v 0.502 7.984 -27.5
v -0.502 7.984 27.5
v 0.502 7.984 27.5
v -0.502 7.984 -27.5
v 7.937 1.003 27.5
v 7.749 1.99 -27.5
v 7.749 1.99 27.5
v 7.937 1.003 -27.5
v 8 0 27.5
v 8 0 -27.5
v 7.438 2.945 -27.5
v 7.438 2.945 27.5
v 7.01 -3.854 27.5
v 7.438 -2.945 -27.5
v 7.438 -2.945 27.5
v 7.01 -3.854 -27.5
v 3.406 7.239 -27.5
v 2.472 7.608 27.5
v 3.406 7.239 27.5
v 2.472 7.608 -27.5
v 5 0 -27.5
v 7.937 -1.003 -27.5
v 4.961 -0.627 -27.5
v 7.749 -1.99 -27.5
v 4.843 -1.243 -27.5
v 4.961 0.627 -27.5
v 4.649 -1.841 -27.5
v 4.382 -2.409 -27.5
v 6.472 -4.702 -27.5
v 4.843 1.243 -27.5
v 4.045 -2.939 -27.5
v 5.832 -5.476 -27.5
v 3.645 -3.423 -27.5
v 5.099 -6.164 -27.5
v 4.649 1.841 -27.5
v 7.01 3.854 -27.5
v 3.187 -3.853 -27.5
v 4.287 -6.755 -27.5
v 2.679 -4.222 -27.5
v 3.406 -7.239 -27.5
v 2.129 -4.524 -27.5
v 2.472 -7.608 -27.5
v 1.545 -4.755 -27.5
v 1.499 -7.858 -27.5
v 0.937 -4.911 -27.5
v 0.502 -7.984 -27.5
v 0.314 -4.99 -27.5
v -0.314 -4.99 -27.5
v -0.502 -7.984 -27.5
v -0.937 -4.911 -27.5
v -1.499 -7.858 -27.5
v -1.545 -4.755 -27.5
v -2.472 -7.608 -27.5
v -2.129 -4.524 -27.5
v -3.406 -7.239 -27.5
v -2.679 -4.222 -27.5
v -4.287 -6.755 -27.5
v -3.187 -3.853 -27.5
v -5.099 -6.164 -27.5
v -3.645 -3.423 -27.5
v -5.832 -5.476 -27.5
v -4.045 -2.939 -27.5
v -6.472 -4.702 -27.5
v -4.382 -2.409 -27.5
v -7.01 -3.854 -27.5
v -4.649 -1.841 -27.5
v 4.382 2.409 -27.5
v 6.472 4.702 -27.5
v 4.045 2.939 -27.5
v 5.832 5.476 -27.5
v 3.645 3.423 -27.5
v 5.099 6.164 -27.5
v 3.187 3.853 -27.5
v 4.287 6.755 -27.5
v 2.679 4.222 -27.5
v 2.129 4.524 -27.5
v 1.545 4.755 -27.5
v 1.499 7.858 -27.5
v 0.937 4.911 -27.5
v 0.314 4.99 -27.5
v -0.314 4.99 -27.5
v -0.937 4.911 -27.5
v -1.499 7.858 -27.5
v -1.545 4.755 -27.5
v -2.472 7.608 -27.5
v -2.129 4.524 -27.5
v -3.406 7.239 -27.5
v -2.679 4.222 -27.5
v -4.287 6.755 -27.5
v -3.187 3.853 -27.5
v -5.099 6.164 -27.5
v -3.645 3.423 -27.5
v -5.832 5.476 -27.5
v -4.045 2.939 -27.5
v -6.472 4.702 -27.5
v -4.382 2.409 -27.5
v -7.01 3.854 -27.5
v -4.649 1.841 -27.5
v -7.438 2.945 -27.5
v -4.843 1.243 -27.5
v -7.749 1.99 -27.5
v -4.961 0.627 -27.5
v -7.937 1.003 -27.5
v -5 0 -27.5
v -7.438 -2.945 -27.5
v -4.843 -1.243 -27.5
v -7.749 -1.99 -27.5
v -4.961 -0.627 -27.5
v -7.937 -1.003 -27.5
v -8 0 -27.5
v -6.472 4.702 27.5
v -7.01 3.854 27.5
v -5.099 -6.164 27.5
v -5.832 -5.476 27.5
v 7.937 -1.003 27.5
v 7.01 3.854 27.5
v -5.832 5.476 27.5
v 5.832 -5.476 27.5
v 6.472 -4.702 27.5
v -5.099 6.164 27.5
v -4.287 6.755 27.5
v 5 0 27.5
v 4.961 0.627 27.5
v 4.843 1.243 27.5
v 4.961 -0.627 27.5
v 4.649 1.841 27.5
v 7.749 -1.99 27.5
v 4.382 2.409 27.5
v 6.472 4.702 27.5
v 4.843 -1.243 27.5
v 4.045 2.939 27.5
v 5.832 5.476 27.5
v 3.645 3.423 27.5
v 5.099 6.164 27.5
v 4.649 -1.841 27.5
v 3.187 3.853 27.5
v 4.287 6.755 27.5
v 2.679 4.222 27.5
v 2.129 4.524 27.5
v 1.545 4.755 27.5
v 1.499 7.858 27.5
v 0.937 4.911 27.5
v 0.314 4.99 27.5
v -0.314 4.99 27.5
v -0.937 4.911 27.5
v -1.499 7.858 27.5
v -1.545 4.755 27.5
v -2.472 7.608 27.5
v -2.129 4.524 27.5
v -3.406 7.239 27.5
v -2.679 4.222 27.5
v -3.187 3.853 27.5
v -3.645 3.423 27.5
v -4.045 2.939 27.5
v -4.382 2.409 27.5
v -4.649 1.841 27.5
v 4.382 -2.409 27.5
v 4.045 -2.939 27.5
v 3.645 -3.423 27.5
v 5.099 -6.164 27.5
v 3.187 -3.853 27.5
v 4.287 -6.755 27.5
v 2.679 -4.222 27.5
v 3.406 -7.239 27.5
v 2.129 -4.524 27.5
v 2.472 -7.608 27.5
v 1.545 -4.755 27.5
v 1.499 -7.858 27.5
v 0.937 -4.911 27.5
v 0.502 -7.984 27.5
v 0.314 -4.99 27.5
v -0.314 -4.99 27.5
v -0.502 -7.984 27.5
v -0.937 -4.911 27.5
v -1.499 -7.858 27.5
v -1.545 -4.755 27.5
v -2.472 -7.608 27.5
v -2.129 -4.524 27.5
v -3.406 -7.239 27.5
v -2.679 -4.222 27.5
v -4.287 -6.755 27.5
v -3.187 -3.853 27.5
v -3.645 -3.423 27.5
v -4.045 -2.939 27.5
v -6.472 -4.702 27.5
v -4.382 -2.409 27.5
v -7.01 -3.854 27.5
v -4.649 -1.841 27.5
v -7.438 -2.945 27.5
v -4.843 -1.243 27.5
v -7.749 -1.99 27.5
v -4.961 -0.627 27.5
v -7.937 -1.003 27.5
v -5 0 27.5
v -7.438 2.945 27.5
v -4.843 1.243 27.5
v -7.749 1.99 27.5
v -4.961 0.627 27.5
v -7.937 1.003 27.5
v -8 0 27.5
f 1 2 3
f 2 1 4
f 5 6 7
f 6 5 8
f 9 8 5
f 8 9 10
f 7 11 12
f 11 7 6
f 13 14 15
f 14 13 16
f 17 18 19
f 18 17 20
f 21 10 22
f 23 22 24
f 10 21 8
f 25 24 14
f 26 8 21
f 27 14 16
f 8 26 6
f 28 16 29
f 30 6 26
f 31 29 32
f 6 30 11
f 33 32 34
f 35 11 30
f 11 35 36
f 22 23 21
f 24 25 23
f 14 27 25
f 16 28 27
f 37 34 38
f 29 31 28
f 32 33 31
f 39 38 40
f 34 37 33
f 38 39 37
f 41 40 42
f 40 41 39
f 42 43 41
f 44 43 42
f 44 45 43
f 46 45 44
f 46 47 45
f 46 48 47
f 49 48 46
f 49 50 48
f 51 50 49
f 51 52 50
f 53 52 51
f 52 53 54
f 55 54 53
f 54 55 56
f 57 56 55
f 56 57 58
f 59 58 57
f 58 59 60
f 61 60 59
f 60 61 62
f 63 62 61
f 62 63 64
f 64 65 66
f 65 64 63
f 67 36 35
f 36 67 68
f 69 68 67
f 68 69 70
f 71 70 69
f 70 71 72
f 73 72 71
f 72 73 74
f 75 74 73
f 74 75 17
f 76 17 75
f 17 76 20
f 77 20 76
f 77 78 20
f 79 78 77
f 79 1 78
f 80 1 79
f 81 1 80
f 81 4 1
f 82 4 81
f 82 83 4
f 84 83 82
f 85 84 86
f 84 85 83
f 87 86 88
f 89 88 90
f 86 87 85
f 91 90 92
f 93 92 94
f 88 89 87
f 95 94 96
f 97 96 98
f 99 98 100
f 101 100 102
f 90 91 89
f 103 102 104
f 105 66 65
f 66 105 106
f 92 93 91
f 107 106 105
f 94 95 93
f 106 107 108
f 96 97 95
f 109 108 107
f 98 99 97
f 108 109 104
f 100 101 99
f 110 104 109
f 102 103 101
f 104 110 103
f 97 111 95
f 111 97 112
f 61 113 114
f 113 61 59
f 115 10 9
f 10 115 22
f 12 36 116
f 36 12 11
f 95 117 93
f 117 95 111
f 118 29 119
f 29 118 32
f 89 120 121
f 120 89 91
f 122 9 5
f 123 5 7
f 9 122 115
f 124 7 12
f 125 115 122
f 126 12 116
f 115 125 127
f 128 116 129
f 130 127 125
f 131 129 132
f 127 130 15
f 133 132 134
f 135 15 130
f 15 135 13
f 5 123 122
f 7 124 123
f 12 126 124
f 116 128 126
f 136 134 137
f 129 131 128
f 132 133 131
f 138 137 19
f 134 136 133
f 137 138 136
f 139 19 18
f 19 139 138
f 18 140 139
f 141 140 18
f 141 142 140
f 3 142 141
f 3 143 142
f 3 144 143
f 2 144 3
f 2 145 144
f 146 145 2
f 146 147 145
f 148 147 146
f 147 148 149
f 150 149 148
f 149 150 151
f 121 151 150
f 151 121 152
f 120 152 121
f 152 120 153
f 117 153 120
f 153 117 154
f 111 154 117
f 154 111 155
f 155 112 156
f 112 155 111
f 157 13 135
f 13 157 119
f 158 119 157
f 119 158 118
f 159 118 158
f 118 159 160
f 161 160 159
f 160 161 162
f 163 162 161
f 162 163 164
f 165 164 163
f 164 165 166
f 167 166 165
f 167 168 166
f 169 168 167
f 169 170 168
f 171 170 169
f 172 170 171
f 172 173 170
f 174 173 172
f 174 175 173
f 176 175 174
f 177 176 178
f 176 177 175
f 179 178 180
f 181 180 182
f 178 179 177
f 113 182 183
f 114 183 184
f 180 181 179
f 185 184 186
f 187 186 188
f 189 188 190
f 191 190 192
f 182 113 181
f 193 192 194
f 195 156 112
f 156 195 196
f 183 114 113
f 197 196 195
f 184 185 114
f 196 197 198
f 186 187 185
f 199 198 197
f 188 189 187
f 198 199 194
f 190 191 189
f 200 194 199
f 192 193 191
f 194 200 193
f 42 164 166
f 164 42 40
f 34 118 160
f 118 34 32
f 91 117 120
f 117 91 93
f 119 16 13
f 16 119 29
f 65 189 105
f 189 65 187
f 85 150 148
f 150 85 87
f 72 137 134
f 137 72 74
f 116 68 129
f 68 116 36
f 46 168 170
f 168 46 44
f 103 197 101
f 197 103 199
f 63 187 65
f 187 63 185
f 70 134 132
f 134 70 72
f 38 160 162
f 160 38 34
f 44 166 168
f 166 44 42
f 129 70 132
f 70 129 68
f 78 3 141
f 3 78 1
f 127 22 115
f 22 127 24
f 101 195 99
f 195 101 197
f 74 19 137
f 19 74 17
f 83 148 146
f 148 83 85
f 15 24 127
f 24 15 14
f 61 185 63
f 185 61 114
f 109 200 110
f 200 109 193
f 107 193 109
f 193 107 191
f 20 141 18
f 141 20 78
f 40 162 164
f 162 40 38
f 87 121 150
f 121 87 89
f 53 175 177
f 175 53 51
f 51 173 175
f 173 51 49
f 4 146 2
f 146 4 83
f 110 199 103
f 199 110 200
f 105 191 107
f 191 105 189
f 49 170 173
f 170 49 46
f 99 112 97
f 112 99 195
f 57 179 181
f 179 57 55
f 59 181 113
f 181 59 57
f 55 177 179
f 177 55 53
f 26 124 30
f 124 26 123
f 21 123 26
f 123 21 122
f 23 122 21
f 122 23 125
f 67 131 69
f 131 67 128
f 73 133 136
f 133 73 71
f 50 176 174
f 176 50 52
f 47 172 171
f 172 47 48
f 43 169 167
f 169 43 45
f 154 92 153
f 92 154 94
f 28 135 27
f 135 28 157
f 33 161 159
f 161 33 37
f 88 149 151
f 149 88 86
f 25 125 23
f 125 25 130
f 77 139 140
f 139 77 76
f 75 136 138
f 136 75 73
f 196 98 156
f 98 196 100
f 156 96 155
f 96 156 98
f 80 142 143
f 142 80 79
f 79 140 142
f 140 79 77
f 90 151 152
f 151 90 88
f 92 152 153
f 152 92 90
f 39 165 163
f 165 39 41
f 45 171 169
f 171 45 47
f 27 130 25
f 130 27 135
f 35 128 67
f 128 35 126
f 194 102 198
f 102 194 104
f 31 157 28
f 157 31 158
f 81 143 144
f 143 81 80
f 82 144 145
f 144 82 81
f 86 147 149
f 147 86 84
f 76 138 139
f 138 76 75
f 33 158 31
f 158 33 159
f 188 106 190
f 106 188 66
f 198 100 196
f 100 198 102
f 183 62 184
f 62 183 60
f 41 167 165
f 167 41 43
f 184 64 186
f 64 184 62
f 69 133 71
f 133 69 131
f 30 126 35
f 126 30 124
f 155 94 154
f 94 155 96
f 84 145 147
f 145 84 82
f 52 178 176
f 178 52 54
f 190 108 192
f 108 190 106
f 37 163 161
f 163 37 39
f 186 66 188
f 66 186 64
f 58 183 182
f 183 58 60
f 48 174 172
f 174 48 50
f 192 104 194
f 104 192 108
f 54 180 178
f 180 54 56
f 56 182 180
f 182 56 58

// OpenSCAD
$fn = 50;


difference() {
	union() {
		translate(v = [0, 0, -27.5000000000]) {
			cylinder(h = 55, r = 8.0000000000);
		}
	}
	union() {
		translate(v = [0, 0, -100.0000000000]) {
			cylinder(h = 200, r = 5.0000000000);
		}
	}
}
